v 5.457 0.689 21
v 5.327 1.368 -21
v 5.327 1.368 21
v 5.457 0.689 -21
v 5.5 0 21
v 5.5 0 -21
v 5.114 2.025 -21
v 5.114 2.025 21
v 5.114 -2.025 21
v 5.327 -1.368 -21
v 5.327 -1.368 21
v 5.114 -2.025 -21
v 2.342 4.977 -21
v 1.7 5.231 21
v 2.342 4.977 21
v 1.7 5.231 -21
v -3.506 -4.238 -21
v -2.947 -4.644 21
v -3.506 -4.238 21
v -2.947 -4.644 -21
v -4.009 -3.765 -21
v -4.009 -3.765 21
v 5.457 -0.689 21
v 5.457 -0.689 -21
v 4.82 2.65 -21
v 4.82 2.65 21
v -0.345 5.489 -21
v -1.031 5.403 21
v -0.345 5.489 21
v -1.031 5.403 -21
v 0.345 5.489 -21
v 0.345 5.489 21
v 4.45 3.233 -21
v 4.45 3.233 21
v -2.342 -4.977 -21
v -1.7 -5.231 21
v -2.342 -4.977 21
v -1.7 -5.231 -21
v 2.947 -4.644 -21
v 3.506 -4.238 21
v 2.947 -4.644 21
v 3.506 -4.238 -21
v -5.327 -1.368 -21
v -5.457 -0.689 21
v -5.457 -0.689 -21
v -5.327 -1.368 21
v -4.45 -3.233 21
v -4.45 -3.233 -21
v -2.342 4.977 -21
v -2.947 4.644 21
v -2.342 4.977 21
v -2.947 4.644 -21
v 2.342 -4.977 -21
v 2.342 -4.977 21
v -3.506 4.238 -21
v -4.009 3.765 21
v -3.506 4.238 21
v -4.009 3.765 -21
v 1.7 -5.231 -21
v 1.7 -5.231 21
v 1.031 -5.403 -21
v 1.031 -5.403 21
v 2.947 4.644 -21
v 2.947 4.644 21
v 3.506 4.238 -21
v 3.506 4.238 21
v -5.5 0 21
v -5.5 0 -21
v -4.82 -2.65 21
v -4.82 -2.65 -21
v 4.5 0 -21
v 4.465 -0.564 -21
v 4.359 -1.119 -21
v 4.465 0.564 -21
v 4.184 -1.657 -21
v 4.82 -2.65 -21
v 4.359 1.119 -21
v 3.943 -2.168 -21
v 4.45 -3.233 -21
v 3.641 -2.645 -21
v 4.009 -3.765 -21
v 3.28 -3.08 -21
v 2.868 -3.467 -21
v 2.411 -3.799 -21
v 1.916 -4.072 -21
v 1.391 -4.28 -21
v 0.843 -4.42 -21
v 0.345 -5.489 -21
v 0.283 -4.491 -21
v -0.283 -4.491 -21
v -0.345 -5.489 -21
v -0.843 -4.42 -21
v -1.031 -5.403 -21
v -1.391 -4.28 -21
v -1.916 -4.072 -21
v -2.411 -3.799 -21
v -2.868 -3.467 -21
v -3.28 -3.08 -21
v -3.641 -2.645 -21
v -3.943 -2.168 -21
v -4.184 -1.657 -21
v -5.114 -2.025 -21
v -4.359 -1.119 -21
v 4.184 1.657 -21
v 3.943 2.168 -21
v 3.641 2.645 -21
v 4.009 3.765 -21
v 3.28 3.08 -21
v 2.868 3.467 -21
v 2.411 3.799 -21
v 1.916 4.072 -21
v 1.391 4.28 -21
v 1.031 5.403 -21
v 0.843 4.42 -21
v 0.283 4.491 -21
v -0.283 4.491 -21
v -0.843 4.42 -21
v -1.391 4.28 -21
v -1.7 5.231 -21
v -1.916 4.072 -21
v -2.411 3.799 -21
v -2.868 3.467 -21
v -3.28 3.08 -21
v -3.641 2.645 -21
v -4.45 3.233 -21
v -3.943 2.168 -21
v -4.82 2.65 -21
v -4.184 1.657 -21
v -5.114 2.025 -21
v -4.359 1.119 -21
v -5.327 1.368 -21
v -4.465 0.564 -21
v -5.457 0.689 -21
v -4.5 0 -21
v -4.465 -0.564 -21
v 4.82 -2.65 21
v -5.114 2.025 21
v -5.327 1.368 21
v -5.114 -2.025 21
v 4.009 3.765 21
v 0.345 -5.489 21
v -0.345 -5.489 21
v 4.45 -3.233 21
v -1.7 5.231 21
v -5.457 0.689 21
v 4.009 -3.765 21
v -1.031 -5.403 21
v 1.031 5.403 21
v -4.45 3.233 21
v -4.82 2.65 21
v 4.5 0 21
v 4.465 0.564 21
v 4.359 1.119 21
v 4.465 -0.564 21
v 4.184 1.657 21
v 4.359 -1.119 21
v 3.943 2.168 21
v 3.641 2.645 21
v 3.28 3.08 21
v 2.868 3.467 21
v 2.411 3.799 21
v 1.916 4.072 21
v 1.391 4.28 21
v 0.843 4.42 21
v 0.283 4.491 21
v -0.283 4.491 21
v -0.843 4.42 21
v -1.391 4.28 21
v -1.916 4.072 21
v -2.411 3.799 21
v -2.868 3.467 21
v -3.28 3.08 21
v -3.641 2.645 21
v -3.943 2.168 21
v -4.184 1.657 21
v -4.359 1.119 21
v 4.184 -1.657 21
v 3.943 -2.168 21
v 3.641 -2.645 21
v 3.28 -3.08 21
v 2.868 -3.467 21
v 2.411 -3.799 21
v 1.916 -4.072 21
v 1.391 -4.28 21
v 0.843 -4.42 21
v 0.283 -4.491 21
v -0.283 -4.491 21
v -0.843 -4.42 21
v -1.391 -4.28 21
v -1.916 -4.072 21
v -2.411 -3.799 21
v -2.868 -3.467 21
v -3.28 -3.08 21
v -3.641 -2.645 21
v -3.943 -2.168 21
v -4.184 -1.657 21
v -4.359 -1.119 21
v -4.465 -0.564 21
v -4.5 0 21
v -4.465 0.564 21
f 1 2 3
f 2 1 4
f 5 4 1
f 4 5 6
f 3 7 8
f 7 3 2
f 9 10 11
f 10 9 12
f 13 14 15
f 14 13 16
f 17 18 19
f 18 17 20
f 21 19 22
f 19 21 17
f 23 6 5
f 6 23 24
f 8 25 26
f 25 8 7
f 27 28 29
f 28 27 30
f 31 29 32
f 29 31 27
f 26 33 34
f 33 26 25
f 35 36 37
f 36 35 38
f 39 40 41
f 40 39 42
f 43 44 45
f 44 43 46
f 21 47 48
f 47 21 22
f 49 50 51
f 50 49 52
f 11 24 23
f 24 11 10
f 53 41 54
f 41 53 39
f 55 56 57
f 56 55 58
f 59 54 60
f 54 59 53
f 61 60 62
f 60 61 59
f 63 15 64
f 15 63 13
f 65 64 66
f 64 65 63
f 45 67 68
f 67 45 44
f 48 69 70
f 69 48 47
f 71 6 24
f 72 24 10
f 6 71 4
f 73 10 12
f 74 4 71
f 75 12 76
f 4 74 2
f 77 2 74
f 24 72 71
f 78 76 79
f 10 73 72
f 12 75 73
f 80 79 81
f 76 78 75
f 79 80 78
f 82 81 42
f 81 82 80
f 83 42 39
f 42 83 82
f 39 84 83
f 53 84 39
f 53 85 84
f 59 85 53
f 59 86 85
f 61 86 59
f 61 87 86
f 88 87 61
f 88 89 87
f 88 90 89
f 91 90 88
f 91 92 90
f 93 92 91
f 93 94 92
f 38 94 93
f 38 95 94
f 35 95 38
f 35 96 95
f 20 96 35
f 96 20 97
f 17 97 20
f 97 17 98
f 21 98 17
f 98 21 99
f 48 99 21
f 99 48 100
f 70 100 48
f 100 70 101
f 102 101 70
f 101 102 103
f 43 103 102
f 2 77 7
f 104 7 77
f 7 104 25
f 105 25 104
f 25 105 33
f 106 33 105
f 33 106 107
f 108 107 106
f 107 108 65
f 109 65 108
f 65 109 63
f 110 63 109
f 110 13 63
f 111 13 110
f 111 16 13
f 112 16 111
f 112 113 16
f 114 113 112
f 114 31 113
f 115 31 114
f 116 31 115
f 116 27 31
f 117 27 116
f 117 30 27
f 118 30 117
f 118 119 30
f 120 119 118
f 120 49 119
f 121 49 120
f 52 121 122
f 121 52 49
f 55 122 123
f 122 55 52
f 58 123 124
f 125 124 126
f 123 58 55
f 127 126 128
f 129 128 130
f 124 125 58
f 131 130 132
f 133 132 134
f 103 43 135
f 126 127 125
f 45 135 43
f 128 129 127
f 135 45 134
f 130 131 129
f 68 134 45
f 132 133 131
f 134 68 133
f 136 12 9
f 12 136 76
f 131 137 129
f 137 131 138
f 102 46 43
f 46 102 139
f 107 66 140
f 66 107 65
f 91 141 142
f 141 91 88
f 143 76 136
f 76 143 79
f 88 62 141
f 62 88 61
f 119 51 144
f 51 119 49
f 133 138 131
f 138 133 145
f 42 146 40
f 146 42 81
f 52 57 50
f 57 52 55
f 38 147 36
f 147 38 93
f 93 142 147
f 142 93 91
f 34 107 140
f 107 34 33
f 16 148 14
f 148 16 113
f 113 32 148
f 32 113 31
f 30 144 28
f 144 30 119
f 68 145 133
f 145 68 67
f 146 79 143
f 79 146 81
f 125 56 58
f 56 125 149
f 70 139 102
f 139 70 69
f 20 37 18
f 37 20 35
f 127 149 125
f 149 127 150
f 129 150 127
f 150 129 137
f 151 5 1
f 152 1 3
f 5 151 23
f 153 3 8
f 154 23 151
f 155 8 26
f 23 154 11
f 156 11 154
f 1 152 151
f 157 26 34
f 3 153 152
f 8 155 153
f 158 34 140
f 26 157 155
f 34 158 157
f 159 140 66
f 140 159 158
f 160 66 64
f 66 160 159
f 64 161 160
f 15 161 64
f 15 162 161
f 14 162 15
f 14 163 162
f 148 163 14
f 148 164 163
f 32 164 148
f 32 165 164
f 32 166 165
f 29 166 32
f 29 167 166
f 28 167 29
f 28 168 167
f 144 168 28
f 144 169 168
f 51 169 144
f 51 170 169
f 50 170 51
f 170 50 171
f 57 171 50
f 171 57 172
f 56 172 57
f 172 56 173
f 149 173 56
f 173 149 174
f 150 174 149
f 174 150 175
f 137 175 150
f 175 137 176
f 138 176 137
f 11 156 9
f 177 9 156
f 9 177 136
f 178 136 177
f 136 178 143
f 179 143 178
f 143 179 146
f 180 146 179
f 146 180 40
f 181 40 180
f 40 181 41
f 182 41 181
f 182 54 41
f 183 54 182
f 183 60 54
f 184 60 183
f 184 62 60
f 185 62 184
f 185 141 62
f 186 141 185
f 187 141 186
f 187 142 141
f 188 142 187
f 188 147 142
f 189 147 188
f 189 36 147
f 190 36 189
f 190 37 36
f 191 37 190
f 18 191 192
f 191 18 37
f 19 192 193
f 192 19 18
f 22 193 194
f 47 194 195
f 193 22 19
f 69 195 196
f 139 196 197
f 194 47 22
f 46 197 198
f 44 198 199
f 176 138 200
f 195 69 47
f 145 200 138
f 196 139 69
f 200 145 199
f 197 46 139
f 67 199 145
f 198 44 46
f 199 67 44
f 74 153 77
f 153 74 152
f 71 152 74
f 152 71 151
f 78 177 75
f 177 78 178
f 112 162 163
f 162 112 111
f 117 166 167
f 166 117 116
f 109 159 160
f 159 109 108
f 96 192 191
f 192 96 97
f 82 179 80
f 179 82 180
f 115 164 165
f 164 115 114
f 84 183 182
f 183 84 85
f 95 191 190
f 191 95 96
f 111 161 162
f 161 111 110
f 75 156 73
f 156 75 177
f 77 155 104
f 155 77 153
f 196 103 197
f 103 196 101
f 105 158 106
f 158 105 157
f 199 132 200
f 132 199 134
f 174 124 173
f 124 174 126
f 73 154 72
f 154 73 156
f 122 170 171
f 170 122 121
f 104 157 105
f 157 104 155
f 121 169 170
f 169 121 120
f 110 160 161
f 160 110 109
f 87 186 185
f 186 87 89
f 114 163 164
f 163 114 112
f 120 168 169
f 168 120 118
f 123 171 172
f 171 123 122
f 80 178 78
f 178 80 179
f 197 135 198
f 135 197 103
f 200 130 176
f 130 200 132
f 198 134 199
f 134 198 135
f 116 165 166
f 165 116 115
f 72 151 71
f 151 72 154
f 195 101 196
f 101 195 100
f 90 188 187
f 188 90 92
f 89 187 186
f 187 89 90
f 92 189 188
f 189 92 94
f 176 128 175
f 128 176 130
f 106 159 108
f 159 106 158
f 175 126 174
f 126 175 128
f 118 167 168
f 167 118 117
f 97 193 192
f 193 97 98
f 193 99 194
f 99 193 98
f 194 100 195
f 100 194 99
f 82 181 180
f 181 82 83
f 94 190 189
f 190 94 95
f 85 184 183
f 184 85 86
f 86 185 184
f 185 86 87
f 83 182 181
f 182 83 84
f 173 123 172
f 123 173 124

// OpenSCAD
$fn = 50;


difference() {
	union() {
		translate(v = [0, 0, -21.0000000000]) {
			cylinder(h = 42, r = 5.5000000000);
		}
	}
	union() {
		translate(v = [0, 0, -100.0000000000]) {
			cylinder(h = 200, r = 4.5000000000);
		}
	}
}
